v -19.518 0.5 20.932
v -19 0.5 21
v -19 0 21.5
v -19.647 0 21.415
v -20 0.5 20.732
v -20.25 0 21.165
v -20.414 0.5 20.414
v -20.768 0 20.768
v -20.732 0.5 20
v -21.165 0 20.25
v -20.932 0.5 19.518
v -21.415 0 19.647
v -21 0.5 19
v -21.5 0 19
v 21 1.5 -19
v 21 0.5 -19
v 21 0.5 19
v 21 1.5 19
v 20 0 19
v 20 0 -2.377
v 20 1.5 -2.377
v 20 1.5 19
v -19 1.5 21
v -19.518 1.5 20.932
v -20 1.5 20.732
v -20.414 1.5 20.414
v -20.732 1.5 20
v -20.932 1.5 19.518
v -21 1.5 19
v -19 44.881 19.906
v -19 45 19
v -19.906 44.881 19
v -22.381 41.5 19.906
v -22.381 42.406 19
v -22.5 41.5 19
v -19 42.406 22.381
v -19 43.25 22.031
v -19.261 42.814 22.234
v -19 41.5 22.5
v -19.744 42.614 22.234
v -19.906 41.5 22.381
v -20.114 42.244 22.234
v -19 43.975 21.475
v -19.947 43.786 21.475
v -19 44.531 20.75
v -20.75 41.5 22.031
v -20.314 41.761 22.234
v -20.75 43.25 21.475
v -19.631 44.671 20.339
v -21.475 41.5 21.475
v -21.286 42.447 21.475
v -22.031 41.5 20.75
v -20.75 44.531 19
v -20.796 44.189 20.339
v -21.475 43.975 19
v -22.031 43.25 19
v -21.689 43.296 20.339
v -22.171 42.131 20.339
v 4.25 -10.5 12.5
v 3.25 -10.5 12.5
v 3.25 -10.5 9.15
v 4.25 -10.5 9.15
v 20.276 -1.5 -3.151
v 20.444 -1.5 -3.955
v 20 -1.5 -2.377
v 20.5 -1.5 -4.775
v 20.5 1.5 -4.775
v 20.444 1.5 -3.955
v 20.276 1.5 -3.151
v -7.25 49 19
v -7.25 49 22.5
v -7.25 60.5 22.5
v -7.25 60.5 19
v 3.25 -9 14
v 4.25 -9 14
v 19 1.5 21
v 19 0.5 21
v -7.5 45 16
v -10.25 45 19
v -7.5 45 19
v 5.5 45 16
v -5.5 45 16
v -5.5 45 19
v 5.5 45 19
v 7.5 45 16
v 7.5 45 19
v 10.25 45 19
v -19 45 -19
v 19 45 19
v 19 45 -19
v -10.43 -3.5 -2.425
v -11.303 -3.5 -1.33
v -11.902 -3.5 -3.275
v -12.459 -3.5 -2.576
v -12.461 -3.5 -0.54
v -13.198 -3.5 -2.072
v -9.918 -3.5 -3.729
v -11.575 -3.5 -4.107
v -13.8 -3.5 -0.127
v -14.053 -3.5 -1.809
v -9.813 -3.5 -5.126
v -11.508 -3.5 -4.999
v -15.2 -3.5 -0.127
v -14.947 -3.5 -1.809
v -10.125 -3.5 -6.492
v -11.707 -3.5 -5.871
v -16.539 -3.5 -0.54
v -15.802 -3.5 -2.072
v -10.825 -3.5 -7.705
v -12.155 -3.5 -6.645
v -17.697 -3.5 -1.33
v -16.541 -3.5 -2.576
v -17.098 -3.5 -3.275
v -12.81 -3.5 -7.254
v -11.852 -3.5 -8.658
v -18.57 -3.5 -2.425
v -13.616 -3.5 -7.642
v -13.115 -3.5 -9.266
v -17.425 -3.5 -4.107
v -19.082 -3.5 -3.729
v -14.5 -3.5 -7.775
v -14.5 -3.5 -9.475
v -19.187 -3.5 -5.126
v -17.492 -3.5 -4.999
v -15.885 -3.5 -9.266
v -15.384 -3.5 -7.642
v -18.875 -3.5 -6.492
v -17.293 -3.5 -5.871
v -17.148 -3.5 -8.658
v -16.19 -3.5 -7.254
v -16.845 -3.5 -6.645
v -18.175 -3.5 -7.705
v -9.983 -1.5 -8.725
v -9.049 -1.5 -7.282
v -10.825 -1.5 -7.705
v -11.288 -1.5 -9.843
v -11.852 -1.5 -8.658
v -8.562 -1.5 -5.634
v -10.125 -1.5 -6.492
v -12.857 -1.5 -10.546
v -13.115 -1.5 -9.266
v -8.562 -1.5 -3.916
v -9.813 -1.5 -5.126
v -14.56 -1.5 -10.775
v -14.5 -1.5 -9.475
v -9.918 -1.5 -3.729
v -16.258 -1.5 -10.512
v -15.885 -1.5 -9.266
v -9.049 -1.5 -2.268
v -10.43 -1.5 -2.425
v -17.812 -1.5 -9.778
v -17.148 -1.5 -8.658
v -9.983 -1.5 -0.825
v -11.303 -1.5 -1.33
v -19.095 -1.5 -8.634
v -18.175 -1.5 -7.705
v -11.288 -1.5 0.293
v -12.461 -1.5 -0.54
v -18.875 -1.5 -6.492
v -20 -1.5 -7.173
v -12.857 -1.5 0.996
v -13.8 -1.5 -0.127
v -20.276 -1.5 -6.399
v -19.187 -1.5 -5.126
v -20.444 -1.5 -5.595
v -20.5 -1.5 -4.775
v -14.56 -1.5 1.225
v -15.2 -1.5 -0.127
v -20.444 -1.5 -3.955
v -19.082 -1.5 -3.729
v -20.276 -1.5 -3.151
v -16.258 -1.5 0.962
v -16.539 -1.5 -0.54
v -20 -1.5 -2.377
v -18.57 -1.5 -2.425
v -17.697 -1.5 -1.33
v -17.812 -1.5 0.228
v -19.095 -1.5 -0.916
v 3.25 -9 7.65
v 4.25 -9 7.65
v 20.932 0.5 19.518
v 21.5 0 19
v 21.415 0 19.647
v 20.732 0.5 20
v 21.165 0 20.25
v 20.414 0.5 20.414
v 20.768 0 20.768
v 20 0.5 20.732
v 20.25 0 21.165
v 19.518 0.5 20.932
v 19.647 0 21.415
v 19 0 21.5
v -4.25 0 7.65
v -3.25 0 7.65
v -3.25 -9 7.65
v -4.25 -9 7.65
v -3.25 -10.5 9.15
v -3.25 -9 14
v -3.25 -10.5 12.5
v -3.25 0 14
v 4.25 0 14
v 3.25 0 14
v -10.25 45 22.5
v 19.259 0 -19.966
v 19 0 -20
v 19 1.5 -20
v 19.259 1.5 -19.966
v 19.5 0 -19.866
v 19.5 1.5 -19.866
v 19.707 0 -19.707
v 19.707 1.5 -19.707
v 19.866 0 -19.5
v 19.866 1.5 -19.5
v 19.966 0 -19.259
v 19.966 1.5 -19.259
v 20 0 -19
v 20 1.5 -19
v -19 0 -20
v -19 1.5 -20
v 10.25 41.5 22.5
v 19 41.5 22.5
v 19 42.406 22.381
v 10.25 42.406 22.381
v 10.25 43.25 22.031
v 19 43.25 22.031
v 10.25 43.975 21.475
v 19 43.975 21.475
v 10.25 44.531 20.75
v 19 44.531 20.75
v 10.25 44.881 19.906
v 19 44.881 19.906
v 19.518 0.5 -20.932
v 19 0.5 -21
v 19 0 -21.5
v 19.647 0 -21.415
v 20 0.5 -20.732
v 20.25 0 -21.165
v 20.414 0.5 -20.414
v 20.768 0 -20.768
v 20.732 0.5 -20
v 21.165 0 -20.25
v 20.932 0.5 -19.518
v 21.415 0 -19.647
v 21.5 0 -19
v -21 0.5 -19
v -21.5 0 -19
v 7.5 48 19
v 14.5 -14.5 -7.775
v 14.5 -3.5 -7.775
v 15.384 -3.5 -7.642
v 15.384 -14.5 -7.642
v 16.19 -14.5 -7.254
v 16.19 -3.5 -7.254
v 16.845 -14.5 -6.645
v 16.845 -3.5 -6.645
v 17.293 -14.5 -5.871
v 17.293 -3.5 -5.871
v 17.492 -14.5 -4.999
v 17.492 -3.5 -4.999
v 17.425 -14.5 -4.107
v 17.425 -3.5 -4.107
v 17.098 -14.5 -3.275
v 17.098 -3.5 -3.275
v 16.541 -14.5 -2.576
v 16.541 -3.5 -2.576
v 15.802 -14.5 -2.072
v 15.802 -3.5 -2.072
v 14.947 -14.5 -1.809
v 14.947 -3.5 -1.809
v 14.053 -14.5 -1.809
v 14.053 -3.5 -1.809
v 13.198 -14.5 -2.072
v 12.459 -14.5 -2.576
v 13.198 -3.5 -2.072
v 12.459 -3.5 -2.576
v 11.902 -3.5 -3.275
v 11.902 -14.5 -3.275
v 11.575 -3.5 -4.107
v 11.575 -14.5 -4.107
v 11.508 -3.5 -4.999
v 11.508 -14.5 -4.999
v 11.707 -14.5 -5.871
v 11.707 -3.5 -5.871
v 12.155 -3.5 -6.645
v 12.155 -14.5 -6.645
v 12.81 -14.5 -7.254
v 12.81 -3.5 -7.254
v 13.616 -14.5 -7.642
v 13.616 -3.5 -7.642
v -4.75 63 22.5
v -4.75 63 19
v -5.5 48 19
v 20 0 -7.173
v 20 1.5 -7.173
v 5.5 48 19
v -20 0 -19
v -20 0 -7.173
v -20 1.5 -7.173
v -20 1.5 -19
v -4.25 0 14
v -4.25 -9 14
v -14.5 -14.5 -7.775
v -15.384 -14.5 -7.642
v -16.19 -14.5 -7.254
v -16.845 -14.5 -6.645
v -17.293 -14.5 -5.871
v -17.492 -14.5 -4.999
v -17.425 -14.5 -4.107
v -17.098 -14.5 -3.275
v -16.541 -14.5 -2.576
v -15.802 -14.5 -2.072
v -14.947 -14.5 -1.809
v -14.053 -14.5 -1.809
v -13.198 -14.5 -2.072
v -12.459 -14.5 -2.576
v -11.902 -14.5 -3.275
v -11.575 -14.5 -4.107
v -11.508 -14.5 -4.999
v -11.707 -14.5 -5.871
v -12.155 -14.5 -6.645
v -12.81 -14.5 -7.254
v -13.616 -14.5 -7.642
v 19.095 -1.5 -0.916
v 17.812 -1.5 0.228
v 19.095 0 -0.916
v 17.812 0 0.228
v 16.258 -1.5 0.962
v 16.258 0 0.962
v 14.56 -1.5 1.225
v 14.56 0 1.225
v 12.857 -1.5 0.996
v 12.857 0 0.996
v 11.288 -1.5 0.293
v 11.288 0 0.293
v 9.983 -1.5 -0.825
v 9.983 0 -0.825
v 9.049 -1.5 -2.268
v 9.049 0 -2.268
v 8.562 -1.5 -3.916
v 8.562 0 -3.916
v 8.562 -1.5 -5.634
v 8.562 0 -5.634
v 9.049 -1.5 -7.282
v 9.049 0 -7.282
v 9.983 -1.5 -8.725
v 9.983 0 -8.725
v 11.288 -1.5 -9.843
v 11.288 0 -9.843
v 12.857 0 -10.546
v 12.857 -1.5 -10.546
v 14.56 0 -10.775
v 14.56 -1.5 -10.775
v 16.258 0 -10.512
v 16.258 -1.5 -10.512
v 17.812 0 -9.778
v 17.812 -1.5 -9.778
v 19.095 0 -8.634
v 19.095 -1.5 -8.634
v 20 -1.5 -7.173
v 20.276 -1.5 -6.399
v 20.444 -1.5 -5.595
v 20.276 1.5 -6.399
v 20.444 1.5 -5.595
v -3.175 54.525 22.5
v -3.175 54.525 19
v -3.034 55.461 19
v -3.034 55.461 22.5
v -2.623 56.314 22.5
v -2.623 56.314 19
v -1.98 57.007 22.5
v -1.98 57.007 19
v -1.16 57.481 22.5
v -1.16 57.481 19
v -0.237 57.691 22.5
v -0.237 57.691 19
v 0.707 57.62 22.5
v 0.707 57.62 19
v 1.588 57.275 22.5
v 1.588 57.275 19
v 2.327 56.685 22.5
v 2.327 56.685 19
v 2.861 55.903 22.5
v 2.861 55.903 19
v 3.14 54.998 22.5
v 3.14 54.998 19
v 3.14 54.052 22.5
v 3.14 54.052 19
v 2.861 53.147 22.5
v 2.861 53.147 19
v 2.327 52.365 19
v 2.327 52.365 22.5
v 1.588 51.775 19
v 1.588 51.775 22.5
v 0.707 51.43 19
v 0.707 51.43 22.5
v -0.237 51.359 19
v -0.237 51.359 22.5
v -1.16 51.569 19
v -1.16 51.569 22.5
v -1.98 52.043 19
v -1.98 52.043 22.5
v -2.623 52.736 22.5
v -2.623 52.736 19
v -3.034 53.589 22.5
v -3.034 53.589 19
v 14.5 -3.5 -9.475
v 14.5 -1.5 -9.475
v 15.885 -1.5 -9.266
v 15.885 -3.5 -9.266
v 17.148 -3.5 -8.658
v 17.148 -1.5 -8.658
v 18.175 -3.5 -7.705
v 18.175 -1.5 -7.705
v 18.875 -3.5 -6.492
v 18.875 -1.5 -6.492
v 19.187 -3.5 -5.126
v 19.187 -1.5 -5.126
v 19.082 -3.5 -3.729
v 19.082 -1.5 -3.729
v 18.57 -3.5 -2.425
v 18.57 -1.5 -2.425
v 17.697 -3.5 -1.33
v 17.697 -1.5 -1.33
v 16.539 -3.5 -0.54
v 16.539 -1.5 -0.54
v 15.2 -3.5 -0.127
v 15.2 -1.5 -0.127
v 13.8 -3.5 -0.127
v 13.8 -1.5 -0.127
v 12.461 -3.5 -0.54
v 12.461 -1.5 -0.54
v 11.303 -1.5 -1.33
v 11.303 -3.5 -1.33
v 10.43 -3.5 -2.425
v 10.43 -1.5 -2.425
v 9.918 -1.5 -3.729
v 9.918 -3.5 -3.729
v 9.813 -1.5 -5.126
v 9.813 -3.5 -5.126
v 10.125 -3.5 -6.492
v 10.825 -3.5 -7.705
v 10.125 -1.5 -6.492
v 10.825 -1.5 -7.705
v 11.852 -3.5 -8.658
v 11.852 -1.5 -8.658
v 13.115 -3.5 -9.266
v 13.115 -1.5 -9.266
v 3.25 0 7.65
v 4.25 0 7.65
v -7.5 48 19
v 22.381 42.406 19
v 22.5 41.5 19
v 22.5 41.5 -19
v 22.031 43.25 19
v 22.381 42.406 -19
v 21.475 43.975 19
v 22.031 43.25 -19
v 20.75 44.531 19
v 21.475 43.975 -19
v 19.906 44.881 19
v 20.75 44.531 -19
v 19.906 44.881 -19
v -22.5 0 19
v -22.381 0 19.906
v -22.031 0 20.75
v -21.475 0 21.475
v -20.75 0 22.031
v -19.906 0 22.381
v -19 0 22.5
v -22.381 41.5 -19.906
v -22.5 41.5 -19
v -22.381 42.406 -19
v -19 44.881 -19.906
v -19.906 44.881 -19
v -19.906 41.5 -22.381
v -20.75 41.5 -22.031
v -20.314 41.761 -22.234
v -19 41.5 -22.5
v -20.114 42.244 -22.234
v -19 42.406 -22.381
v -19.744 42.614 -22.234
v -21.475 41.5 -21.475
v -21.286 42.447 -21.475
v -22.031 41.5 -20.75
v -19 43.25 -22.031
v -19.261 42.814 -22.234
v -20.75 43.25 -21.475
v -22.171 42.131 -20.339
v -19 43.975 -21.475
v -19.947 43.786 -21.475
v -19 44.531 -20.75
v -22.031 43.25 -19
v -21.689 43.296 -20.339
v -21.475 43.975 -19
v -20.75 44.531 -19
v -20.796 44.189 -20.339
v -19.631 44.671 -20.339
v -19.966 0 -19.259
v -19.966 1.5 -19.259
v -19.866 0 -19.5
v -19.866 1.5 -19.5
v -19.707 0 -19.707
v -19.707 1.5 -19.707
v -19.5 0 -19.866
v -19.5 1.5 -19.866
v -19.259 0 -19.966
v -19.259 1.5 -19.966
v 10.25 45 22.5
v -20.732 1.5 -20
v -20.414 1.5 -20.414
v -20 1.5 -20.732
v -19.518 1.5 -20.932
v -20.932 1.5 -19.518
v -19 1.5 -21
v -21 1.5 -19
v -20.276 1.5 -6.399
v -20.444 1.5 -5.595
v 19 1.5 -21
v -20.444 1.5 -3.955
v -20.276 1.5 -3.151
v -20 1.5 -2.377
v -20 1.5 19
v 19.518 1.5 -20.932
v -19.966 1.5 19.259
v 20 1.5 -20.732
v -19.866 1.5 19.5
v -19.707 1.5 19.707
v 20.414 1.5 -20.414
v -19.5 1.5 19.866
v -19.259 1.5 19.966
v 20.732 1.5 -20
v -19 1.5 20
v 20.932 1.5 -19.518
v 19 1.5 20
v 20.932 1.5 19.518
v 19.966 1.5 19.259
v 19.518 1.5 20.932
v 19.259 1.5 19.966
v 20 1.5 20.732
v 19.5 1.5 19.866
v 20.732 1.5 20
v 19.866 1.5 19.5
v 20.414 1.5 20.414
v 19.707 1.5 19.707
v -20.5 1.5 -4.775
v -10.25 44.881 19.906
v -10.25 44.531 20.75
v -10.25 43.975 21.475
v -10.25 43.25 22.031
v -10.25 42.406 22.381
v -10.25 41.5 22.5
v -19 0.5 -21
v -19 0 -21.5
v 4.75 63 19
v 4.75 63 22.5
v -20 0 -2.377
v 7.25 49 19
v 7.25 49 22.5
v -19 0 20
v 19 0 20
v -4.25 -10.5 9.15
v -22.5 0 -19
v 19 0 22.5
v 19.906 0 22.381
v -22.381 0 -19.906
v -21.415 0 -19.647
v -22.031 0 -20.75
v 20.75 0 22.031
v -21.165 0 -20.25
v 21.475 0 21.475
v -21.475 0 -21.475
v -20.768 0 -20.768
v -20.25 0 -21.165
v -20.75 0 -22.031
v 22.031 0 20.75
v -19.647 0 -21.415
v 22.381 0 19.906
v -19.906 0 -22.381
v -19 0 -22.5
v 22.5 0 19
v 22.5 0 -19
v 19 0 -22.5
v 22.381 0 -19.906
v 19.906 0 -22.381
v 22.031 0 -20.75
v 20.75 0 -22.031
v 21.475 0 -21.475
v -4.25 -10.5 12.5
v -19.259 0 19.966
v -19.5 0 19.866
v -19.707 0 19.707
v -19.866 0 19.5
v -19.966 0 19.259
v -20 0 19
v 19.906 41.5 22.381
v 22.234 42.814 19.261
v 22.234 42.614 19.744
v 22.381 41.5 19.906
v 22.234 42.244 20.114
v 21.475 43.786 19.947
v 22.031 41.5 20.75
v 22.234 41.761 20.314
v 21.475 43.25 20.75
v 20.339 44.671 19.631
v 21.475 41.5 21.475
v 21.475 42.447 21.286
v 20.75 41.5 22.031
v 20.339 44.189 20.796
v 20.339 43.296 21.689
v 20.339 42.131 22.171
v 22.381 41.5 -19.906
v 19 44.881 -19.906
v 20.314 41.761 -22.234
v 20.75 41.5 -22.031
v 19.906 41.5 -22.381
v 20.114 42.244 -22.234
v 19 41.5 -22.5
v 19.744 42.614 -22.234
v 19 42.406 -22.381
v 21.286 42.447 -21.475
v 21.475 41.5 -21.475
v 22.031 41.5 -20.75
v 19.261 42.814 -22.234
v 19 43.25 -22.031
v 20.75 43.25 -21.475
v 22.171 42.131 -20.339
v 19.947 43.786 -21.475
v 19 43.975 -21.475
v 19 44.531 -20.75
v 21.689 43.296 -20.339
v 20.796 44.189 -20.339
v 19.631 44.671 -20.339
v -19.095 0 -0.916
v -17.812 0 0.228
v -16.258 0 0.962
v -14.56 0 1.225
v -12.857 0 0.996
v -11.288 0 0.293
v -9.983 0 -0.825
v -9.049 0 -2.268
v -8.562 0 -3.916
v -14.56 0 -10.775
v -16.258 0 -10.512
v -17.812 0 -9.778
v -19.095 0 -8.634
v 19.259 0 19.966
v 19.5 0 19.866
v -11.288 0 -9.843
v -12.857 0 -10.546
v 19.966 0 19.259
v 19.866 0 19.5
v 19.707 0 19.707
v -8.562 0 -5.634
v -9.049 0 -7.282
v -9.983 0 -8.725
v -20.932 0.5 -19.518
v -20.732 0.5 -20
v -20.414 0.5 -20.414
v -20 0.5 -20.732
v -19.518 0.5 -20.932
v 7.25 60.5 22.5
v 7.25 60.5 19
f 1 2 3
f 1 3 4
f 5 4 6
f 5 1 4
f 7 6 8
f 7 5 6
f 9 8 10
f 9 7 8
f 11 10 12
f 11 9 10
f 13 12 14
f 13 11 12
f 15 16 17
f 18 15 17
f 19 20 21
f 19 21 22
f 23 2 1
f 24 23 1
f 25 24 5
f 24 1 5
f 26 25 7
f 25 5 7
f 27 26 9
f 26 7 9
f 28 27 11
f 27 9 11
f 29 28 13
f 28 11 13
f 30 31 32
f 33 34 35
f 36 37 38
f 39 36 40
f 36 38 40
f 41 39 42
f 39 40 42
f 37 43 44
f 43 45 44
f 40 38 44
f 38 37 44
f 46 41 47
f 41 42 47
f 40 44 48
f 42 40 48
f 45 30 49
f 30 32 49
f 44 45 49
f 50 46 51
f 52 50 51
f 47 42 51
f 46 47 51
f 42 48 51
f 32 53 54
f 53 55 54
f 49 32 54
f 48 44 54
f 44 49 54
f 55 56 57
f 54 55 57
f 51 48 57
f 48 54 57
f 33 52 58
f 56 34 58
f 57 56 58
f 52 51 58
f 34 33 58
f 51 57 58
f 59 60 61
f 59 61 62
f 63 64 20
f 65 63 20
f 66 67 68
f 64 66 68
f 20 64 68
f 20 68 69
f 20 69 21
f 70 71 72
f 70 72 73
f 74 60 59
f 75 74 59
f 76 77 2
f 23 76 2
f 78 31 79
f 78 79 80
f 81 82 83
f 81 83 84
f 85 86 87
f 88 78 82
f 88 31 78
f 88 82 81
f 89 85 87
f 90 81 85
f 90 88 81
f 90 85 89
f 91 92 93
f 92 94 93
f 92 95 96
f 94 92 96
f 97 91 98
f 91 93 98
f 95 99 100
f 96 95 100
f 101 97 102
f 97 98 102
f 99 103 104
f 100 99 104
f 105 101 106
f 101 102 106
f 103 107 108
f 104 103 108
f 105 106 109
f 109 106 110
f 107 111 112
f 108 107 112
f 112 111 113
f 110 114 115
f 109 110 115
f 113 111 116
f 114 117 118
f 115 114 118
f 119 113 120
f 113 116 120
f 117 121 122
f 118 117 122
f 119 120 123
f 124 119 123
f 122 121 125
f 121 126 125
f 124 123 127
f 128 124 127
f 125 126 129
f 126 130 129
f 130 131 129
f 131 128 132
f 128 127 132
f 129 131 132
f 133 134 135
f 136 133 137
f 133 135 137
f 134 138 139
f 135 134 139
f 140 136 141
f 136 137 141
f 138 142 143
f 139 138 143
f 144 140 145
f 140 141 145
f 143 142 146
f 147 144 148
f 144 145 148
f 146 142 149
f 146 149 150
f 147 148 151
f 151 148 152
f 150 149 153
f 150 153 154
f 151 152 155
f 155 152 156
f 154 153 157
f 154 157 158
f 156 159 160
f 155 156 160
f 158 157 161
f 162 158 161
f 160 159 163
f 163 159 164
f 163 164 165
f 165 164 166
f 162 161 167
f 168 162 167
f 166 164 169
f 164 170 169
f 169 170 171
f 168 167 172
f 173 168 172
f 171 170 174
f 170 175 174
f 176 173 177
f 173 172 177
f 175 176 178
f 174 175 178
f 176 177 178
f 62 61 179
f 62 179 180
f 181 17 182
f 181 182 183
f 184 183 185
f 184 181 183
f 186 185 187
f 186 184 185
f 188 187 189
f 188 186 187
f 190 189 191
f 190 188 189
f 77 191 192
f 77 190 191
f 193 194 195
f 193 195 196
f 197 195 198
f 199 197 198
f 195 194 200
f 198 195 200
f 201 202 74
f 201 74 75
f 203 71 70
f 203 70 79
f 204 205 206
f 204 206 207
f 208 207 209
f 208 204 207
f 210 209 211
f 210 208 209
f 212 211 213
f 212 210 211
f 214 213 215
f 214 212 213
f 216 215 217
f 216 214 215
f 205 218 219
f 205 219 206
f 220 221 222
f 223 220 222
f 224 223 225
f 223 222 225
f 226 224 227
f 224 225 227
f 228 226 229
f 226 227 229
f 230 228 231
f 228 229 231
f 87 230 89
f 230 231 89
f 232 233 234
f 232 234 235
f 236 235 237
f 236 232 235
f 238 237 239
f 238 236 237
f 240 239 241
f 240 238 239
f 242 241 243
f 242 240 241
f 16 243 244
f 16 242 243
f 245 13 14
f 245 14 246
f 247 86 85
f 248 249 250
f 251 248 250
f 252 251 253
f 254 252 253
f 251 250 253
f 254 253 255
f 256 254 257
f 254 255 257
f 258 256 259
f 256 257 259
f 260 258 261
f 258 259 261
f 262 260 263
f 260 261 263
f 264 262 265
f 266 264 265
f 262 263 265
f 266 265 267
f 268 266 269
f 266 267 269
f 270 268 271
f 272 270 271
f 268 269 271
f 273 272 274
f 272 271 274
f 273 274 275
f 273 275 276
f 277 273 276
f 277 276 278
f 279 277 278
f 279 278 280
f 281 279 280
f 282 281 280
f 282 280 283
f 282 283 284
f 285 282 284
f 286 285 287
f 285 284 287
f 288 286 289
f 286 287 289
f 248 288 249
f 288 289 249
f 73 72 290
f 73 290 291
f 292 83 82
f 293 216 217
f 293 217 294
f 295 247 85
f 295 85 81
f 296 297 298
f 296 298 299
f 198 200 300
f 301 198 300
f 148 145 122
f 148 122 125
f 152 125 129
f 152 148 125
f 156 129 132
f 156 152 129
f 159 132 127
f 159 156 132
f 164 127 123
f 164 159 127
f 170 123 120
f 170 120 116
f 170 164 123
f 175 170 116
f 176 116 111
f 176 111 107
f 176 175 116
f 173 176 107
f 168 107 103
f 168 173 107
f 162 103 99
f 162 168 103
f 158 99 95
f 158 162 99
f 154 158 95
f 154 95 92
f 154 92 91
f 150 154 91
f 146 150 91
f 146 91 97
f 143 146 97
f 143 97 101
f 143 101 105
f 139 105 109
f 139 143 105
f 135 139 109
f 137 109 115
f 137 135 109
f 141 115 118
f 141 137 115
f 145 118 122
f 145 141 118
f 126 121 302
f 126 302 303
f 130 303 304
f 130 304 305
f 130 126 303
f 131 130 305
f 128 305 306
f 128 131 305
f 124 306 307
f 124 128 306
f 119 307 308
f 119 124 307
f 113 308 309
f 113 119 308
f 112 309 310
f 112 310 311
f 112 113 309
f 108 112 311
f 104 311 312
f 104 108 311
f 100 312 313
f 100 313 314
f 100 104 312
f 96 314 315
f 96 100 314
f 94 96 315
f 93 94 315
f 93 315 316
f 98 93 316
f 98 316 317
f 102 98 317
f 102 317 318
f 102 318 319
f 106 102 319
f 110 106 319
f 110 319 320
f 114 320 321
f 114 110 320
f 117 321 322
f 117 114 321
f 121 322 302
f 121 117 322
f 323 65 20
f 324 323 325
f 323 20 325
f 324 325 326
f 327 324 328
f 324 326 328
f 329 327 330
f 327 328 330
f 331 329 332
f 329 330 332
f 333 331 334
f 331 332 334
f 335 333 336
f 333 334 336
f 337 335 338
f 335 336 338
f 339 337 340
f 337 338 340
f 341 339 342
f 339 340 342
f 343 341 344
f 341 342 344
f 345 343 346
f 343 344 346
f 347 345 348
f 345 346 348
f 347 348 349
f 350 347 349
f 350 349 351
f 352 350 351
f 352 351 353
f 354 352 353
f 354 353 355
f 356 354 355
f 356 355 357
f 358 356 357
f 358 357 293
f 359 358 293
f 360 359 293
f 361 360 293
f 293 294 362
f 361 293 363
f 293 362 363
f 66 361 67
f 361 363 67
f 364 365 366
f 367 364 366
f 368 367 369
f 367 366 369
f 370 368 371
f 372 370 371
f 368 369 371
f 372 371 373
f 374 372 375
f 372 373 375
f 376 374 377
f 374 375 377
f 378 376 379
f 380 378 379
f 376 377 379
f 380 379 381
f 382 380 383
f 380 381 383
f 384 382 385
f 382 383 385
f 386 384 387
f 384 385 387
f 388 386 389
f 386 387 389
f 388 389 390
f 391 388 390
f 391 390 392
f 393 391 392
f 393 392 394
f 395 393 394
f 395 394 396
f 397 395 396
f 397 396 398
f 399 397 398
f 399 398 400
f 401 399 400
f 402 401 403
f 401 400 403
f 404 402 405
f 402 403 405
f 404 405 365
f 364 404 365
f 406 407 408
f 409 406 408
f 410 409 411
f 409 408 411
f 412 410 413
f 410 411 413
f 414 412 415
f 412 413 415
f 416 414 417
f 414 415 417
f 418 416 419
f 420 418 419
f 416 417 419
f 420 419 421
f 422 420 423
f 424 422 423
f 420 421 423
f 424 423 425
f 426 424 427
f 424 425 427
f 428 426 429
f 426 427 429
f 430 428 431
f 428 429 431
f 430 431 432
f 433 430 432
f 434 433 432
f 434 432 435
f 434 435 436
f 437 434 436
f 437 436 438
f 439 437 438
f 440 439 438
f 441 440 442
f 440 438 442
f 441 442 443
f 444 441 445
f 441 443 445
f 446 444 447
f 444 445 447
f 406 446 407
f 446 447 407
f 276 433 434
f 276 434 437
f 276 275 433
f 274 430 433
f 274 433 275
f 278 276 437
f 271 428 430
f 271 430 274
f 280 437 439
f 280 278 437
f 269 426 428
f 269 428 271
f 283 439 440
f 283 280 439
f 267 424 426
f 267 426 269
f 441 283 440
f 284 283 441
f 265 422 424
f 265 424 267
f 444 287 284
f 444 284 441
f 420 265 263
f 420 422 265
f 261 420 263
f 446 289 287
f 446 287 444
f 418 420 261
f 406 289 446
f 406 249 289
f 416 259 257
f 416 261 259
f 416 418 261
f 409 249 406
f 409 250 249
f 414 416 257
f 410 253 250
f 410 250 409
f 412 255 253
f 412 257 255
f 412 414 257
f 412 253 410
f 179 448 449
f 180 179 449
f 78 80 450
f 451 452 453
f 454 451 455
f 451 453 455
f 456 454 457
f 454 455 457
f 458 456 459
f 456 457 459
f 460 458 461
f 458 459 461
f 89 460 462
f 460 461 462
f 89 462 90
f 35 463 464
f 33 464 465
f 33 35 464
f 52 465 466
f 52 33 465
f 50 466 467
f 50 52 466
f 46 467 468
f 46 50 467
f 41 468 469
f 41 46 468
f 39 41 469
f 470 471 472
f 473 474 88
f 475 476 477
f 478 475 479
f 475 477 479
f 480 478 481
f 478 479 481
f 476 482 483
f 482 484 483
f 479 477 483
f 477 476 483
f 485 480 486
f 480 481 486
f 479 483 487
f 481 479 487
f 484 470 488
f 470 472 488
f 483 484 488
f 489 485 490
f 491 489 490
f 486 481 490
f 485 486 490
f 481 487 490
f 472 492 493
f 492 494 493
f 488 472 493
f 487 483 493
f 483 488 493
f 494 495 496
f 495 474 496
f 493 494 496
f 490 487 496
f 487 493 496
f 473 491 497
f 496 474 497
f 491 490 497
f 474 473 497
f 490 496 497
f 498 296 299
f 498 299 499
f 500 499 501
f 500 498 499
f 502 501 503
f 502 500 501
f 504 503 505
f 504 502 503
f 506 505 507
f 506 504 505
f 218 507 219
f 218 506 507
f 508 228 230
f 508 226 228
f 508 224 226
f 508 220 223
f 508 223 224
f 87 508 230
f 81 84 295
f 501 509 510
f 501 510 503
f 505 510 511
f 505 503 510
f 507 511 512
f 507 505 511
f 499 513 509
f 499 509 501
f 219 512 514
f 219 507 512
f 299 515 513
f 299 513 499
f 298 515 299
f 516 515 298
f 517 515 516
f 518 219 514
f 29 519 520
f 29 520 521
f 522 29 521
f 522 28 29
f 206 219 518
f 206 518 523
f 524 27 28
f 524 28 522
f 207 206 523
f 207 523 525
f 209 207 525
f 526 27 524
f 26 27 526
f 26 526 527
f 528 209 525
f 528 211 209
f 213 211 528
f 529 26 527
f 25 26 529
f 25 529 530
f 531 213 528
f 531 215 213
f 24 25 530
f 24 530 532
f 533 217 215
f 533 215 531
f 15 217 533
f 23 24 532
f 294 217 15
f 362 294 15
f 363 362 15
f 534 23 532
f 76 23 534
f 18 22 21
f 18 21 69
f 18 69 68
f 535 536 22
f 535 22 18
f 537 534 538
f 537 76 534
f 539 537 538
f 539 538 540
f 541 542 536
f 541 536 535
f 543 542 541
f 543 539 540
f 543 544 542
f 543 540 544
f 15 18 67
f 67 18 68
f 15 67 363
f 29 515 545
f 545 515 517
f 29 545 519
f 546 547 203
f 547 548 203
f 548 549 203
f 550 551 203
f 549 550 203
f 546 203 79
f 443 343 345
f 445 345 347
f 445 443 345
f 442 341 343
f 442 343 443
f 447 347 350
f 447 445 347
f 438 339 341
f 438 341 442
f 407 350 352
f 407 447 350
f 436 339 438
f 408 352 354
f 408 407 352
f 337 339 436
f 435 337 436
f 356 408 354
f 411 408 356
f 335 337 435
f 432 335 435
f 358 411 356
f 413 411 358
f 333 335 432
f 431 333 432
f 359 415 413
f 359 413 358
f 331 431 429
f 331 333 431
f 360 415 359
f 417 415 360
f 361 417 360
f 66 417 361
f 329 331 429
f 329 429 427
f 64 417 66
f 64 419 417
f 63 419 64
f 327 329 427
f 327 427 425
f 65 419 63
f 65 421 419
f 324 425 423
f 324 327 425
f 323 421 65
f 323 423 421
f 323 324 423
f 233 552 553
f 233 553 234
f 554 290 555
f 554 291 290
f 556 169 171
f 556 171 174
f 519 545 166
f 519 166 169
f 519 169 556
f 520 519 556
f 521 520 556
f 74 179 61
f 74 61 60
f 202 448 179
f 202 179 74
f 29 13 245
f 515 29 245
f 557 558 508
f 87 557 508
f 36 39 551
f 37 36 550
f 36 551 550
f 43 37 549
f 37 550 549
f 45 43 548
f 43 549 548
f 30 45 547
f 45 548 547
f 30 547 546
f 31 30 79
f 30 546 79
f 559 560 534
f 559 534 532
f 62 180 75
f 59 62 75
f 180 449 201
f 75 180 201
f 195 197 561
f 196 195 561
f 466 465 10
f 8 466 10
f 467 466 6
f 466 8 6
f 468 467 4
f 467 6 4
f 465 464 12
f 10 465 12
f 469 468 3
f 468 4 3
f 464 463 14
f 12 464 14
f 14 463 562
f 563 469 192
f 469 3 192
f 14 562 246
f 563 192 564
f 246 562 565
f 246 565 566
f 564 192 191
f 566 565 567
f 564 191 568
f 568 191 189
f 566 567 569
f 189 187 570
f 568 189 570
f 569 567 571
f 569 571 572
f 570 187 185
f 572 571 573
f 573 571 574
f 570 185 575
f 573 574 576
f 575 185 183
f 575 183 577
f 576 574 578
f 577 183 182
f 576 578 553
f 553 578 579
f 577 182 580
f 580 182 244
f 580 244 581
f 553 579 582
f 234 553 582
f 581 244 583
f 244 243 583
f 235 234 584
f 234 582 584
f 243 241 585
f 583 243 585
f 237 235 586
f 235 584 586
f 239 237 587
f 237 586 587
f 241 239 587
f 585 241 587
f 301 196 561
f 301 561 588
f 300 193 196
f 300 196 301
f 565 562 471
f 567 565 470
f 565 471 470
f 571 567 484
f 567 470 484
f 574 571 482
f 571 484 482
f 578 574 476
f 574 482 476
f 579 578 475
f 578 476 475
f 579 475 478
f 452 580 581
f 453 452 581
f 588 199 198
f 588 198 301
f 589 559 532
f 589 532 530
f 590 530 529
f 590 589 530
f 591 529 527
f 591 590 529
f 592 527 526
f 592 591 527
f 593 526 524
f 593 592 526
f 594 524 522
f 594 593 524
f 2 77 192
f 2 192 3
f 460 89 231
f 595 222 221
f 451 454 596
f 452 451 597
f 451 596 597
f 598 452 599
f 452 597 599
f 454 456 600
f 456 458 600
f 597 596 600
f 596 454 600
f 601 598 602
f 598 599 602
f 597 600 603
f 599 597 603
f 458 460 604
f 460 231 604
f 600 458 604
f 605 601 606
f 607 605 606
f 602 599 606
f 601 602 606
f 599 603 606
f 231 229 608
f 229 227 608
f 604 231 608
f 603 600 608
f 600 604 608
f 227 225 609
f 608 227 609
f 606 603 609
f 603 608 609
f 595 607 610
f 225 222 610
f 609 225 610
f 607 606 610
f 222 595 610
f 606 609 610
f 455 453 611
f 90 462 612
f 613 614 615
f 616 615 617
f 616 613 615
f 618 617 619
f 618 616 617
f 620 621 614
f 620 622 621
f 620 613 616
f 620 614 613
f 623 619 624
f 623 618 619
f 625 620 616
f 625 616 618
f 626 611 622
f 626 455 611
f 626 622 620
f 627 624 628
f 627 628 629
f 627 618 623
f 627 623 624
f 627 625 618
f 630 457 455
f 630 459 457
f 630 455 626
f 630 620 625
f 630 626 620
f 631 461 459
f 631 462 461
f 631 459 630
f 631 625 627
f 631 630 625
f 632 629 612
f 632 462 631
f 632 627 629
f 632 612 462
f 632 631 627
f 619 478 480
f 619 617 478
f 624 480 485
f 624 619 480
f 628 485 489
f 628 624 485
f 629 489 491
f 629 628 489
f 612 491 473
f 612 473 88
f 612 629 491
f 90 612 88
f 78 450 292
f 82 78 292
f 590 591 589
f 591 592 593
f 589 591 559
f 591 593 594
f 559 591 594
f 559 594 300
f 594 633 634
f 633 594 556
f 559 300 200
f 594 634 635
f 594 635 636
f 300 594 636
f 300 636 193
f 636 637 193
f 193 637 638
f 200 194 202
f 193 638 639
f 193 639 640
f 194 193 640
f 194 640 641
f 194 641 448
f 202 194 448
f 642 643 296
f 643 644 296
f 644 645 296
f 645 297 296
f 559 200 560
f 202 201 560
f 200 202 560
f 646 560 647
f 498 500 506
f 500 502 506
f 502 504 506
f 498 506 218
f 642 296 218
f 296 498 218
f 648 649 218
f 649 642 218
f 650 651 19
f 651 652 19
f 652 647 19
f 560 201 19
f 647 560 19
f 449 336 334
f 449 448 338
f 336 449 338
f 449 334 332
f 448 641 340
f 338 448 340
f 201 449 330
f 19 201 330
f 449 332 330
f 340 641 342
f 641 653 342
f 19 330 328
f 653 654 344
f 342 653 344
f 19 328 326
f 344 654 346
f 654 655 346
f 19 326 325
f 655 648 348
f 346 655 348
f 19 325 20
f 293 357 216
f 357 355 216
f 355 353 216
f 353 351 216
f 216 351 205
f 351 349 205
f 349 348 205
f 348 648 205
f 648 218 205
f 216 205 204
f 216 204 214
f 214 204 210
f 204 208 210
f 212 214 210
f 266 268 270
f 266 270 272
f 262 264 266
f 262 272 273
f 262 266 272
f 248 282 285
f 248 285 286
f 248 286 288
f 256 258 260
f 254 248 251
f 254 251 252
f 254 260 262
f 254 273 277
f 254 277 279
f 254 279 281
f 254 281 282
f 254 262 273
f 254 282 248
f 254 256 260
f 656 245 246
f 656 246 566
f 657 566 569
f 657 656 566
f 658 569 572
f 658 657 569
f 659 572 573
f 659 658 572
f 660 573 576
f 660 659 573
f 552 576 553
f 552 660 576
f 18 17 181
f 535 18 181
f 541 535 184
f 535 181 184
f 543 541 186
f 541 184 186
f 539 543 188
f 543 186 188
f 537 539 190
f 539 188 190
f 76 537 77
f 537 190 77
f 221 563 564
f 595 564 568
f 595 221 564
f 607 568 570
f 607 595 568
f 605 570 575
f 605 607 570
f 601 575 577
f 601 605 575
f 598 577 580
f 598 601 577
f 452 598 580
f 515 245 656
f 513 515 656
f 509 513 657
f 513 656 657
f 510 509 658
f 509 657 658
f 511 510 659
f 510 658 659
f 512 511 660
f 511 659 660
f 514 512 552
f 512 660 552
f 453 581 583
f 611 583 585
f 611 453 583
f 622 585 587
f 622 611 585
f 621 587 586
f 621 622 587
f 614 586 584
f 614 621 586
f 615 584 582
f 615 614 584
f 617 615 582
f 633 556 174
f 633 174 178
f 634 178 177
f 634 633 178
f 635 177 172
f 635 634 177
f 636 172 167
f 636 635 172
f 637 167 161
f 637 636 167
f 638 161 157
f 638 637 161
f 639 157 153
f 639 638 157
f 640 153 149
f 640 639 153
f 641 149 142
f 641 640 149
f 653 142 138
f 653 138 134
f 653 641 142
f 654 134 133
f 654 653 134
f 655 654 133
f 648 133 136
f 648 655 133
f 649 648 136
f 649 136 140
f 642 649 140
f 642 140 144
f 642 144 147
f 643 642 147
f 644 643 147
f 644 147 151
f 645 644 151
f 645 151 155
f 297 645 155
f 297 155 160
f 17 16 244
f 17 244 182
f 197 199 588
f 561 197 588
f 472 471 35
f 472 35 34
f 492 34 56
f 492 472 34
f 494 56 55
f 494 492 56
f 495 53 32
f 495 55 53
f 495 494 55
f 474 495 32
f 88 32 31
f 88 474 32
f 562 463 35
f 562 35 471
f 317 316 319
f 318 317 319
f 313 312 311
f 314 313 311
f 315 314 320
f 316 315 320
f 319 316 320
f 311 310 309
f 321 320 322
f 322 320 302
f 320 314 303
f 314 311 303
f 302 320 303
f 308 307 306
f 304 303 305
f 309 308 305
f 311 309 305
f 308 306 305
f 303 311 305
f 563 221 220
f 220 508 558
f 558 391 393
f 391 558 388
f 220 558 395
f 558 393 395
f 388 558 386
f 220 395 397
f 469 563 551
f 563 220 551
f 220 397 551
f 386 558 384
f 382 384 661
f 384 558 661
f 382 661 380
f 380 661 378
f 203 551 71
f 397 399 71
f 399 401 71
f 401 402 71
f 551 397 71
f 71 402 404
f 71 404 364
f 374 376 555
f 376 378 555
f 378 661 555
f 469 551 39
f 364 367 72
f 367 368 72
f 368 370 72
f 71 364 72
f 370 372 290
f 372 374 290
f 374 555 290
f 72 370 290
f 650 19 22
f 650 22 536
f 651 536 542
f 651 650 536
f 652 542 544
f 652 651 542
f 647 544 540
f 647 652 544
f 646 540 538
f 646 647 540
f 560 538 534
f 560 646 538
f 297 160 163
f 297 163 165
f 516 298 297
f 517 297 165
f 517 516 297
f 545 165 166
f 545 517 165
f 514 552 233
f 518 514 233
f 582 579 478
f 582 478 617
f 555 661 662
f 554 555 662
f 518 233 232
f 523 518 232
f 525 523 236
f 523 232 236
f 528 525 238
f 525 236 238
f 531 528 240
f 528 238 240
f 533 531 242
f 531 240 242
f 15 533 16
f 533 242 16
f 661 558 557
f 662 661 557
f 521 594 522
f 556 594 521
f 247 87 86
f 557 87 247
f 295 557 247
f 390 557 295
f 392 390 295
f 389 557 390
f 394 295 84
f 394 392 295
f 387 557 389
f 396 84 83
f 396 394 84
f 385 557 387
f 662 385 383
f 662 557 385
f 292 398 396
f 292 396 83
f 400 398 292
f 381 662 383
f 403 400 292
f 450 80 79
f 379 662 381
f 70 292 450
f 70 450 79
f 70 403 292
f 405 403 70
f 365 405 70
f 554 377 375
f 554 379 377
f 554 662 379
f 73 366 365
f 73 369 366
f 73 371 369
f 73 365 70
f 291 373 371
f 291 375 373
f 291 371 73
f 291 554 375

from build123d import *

# Parameters (mm, degrees)
SKETCH_1_W                 = 45
SKETCH_1_H                 = 45
EXTRUDE_1_DEPTH            = 45
FILLET_1_R                 = 3.5
EXTRUDE_2_DEPTH            = 18
EXTRUDE_2_DEPTH_BACK       = 5
SKETCH_2_W                 = 14.5
SKETCH_2_H                 = 3.5
SKETCH_4_W                 = 3
SKETCH_4_H                 = 3.5
EXTRUDE_3_DEPTH            = 3.5
CHAMFER_1_SIZE             = 2.5
SKETCH_5_R                 = 3.175
CUT_EXTRUDE_1_DEPTH        = 3.5
SKETCH_6_W                 = 2
SKETCH_6_H                 = 3
EXTRUDE_4_DEPTH            = 3
CHAMFER_2_SIZE             = 3
CHAMFER_2_OF_MIRROR_2_SIZE = 3
CUT_EXTRUDE_2_DEPTH        = 1.5
CHAMFER_3_SIZE             = 0.5
SKETCH_8_W                 = 1
SKETCH_8_H                 = 6.35
EXTRUDE_5_DEPTH            = 10.5
EXTRUDE_START              = -2
EXTRUDE_6_DEPTH            = 3.5
SKETCH_10_R                = 4.7
EXTRUDE_7_DEPTH            = 2
SKETCH_11_R                = 3
EXTRUDE_8_DEPTH            = 11
CHAMFER_4_SIZE             = 1.5


with BuildPart() as part:
    # ｽｹｯﾁ1 → ﾎﾞｽ - 押し出し1 (new body)
    with BuildSketch(Plane(origin=(0, 0, 0), x_dir=(1, 0, 0), z_dir=(0, 1, 0))):
        Rectangle(SKETCH_1_W, SKETCH_1_H)
    extrude(amount=EXTRUDE_1_DEPTH)

    # ﾌｨﾚｯﾄ1
    fillet_1_edges = [part.edges().sort_by_distance(p)[0] for p in [
        (-22.5, 45, 0),
        (0, 45, 22.5),
        (22.5, 45, 0),
        (22.5, 22.5, 22.5),
        (-22.5, 22.5, 22.5),
        (-22.5, 22.5, -22.5),
        (22.5, 22.5, -22.5),
        (0, 45, -22.5),
    ]]
    fillet(fillet_1_edges, radius=FILLET_1_R)

    # ｽｹｯﾁ2 → ﾎﾞｽ - 押し出し2 (add, two sides: drawn at the far end of the back side and taken through both)
    with BuildSketch(Plane(origin=(0, 45, 0), x_dir=(1, 0, 0), z_dir=(0, 1, 0)).offset(-EXTRUDE_2_DEPTH_BACK)):
        with Locations((0, -20.75)):
            Rectangle(SKETCH_2_W, SKETCH_2_H)
    extrude(amount=EXTRUDE_2_DEPTH + EXTRUDE_2_DEPTH_BACK)

    # ｽｹｯﾁ4 → ﾎﾞｽ - 押し出し3 (add)
    with BuildSketch(Plane.XY.offset(22.5)):
        Polygon((-7.25, 45), (-7.25, 49), (-10.25, 45), align=None)
        with Locations((-8.75, 43.25)):
            Rectangle(SKETCH_4_W, SKETCH_4_H)
    extrude_3 = extrude(amount=-EXTRUDE_3_DEPTH)

    # ﾐﾗｰ1: ﾎﾞｽ - 押し出し3 across plane
    add(extrude_3.mirror(Plane(origin=(0, 0, 0), x_dir=(0, 0, 1), z_dir=(1, 0, 0))))

    # 面取り1
    chamfer_1_edges = [part.edges().sort_by_distance(p)[0] for p in [
        (-7.25, 63, 20.75),
        (7.25, 63, 20.75),
    ]]
    chamfer(chamfer_1_edges, length=CHAMFER_1_SIZE)

    # ｽｹｯﾁ5 → ｶｯﾄ - 押し出し1 (cut)
    with BuildSketch(Plane(origin=(0, 0, 19), x_dir=(-1, 0, 0), z_dir=(0, 0, -1))):
        with Locations((0, 54.525)):
            Circle(SKETCH_5_R)
    extrude(amount=-CUT_EXTRUDE_1_DEPTH, mode=Mode.SUBTRACT)

    # ｽｹｯﾁ6 → ﾎﾞｽ - 押し出し4 (add)
    with BuildSketch(Plane(origin=(0, 0, 19), x_dir=(-1, 0, 0), z_dir=(0, 0, -1))):
        with Locations((-6.5, 46.5)):
            Rectangle(SKETCH_6_W, SKETCH_6_H)
    extrude_4 = extrude(amount=EXTRUDE_4_DEPTH)

    # 面取り2
    chamfer_2_edges = [part.edges().sort_by_distance(p)[0] for p in [
        (6.5, 48, 16),
    ]]
    chamfer(chamfer_2_edges, length=CHAMFER_2_SIZE - 0.0001)  # a hair under: the kernel refuses the full size

    # ﾐﾗｰ2: ﾎﾞｽ - 押し出し4 across plane
    add(extrude_4.mirror(Plane(origin=(0, 0, 0), x_dir=(0, 0, 1), z_dir=(1, 0, 0))))

    # 面取り2 of ﾐﾗｰ2
    chamfer_2_of_mirror_2_edges = [part.edges().sort_by_distance(p)[0] for p in [
        (-6.5, 48, 16),
    ]]
    chamfer(chamfer_2_of_mirror_2_edges, length=CHAMFER_2_OF_MIRROR_2_SIZE - 0.0001)  # a hair under: the kernel refuses the full size

    # ｽｹｯﾁ7 → ｶｯﾄ - 押し出し2 (cut)
    with BuildSketch(Plane.XZ):
        with BuildLine():
            Line((21, -19), (21, 19))
            ThreePointArc((21, 19), (20.414213562, 20.414213562), (19, 21))
            Line((19, 21), (-19, 21))
            ThreePointArc((-19, 21), (-20.414213562, 20.414213562), (-21, 19))
            Line((-21, 19), (-21, -19))
            ThreePointArc((-21, -19), (-20.414213562, -20.414213562), (-19, -21))
            Line((-19, -21), (19, -21))
            ThreePointArc((19, -21), (20.414213562, -20.414213562), (21, -19))
        make_face()
        with BuildLine():
            ThreePointArc((20, 19), (19.707106781, 19.707106781), (19, 20))
            Line((19, 20), (-19, 20))
            ThreePointArc((-19, 20), (-19.707106781, 19.707106781), (-20, 19))
            Line((-20, 19), (-20, -19))
            ThreePointArc((-20, -19), (-19.707106781, -19.707106781), (-19, -20))
            Line((-19, -20), (19, -20))
            ThreePointArc((19, -20), (19.707106781, -19.707106781), (20, -19))
            Line((20, -19), (20, 19))
        make_face(mode=Mode.SUBTRACT)
    extrude(amount=-CUT_EXTRUDE_2_DEPTH, mode=Mode.SUBTRACT)

    # 面取り3
    chamfer_3_edges = [part.edges().sort_by_distance(p)[0] for p in [
        (21, 0, 0),
        (20.414213562, 0, 20.414213562),
        (0, 0, 21),
        (-20.414213562, 0, 20.414213562),
        (-21, 0, 0),
        (-20.414213562, 0, -20.414213562),
        (0, 0, -21),
        (20.414213562, 0, -20.414213562),
    ]]
    chamfer(chamfer_3_edges, length=CHAMFER_3_SIZE)

    # ｽｹｯﾁ8 → ﾎﾞｽ - 押し出し5 (add)
    with BuildSketch(Plane.XZ):
        with Locations((3.75, 10.825)):
            Rectangle(SKETCH_8_W, SKETCH_8_H)
    extrude_5 = extrude(amount=EXTRUDE_5_DEPTH)

    # ｽｹｯﾁ9 → ﾎﾞｽ - 押し出し6 (add)
    with BuildSketch(Plane.XZ.offset(EXTRUDE_START)):
        with BuildLine():
            ThreePointArc((20, -7.172915762), (20.373670062, -5.999744871), (20.5, -4.775))
            ThreePointArc((20.5, -4.775), (20.373670062, -3.550255129), (20, -2.377084238))
            Line((20, -2.377084238), (20, -7.172915762))
        make_face()
        with BuildLine():
            Line((20, -7.172915762), (20, -2.377084238))
            ThreePointArc((20, -2.377084238), (8.5, -4.775), (20, -7.172915762))
        make_face()
    extrude_6 = extrude(amount=EXTRUDE_6_DEPTH)

    # ｽｹｯﾁ10 → ﾎﾞｽ - 押し出し7 (add)
    with BuildSketch(Plane.XZ.offset(1.5)):
        with Locations(Location((14.5, -4.775, 0), (0, 0, 270))):
            Circle(SKETCH_10_R)
    extrude_7 = extrude(amount=EXTRUDE_7_DEPTH)

    # ｽｹｯﾁ11 → ﾎﾞｽ - 押し出し8 (add)
    with BuildSketch(Plane.XZ.offset(3.5)):
        with Locations(Location((14.5, -4.775, 0), (0, 0, 270))):
            Circle(SKETCH_11_R)
    extrude_8 = extrude(amount=EXTRUDE_8_DEPTH)

    # ﾐﾗｰ3: ﾎﾞｽ - 押し出し5, ﾎﾞｽ - 押し出し6, ﾎﾞｽ - 押し出し7, ﾎﾞｽ - 押し出し8 across plane
    add(extrude_5.mirror(Plane(origin=(0, 0, 0), x_dir=(0, 0, 1), z_dir=(1, 0, 0))))
    add(extrude_6.mirror(Plane(origin=(0, 0, 0), x_dir=(0, 0, 1), z_dir=(1, 0, 0))))
    add(extrude_7.mirror(Plane(origin=(0, 0, 0), x_dir=(0, 0, 1), z_dir=(1, 0, 0))))
    add(extrude_8.mirror(Plane(origin=(0, 0, 0), x_dir=(0, 0, 1), z_dir=(1, 0, 0))))

    # 面取り4
    chamfer_4_edges = [part.edges().sort_by_distance(p)[0] for p in [
        (3.75, -10.5, 14),
        (3.75, -10.5, 7.65),
        (-3.75, -10.5, 7.65),
        (-3.75, -10.5, 14),
    ]]
    chamfer(chamfer_4_edges, length=CHAMFER_4_SIZE)


solid = part.part
